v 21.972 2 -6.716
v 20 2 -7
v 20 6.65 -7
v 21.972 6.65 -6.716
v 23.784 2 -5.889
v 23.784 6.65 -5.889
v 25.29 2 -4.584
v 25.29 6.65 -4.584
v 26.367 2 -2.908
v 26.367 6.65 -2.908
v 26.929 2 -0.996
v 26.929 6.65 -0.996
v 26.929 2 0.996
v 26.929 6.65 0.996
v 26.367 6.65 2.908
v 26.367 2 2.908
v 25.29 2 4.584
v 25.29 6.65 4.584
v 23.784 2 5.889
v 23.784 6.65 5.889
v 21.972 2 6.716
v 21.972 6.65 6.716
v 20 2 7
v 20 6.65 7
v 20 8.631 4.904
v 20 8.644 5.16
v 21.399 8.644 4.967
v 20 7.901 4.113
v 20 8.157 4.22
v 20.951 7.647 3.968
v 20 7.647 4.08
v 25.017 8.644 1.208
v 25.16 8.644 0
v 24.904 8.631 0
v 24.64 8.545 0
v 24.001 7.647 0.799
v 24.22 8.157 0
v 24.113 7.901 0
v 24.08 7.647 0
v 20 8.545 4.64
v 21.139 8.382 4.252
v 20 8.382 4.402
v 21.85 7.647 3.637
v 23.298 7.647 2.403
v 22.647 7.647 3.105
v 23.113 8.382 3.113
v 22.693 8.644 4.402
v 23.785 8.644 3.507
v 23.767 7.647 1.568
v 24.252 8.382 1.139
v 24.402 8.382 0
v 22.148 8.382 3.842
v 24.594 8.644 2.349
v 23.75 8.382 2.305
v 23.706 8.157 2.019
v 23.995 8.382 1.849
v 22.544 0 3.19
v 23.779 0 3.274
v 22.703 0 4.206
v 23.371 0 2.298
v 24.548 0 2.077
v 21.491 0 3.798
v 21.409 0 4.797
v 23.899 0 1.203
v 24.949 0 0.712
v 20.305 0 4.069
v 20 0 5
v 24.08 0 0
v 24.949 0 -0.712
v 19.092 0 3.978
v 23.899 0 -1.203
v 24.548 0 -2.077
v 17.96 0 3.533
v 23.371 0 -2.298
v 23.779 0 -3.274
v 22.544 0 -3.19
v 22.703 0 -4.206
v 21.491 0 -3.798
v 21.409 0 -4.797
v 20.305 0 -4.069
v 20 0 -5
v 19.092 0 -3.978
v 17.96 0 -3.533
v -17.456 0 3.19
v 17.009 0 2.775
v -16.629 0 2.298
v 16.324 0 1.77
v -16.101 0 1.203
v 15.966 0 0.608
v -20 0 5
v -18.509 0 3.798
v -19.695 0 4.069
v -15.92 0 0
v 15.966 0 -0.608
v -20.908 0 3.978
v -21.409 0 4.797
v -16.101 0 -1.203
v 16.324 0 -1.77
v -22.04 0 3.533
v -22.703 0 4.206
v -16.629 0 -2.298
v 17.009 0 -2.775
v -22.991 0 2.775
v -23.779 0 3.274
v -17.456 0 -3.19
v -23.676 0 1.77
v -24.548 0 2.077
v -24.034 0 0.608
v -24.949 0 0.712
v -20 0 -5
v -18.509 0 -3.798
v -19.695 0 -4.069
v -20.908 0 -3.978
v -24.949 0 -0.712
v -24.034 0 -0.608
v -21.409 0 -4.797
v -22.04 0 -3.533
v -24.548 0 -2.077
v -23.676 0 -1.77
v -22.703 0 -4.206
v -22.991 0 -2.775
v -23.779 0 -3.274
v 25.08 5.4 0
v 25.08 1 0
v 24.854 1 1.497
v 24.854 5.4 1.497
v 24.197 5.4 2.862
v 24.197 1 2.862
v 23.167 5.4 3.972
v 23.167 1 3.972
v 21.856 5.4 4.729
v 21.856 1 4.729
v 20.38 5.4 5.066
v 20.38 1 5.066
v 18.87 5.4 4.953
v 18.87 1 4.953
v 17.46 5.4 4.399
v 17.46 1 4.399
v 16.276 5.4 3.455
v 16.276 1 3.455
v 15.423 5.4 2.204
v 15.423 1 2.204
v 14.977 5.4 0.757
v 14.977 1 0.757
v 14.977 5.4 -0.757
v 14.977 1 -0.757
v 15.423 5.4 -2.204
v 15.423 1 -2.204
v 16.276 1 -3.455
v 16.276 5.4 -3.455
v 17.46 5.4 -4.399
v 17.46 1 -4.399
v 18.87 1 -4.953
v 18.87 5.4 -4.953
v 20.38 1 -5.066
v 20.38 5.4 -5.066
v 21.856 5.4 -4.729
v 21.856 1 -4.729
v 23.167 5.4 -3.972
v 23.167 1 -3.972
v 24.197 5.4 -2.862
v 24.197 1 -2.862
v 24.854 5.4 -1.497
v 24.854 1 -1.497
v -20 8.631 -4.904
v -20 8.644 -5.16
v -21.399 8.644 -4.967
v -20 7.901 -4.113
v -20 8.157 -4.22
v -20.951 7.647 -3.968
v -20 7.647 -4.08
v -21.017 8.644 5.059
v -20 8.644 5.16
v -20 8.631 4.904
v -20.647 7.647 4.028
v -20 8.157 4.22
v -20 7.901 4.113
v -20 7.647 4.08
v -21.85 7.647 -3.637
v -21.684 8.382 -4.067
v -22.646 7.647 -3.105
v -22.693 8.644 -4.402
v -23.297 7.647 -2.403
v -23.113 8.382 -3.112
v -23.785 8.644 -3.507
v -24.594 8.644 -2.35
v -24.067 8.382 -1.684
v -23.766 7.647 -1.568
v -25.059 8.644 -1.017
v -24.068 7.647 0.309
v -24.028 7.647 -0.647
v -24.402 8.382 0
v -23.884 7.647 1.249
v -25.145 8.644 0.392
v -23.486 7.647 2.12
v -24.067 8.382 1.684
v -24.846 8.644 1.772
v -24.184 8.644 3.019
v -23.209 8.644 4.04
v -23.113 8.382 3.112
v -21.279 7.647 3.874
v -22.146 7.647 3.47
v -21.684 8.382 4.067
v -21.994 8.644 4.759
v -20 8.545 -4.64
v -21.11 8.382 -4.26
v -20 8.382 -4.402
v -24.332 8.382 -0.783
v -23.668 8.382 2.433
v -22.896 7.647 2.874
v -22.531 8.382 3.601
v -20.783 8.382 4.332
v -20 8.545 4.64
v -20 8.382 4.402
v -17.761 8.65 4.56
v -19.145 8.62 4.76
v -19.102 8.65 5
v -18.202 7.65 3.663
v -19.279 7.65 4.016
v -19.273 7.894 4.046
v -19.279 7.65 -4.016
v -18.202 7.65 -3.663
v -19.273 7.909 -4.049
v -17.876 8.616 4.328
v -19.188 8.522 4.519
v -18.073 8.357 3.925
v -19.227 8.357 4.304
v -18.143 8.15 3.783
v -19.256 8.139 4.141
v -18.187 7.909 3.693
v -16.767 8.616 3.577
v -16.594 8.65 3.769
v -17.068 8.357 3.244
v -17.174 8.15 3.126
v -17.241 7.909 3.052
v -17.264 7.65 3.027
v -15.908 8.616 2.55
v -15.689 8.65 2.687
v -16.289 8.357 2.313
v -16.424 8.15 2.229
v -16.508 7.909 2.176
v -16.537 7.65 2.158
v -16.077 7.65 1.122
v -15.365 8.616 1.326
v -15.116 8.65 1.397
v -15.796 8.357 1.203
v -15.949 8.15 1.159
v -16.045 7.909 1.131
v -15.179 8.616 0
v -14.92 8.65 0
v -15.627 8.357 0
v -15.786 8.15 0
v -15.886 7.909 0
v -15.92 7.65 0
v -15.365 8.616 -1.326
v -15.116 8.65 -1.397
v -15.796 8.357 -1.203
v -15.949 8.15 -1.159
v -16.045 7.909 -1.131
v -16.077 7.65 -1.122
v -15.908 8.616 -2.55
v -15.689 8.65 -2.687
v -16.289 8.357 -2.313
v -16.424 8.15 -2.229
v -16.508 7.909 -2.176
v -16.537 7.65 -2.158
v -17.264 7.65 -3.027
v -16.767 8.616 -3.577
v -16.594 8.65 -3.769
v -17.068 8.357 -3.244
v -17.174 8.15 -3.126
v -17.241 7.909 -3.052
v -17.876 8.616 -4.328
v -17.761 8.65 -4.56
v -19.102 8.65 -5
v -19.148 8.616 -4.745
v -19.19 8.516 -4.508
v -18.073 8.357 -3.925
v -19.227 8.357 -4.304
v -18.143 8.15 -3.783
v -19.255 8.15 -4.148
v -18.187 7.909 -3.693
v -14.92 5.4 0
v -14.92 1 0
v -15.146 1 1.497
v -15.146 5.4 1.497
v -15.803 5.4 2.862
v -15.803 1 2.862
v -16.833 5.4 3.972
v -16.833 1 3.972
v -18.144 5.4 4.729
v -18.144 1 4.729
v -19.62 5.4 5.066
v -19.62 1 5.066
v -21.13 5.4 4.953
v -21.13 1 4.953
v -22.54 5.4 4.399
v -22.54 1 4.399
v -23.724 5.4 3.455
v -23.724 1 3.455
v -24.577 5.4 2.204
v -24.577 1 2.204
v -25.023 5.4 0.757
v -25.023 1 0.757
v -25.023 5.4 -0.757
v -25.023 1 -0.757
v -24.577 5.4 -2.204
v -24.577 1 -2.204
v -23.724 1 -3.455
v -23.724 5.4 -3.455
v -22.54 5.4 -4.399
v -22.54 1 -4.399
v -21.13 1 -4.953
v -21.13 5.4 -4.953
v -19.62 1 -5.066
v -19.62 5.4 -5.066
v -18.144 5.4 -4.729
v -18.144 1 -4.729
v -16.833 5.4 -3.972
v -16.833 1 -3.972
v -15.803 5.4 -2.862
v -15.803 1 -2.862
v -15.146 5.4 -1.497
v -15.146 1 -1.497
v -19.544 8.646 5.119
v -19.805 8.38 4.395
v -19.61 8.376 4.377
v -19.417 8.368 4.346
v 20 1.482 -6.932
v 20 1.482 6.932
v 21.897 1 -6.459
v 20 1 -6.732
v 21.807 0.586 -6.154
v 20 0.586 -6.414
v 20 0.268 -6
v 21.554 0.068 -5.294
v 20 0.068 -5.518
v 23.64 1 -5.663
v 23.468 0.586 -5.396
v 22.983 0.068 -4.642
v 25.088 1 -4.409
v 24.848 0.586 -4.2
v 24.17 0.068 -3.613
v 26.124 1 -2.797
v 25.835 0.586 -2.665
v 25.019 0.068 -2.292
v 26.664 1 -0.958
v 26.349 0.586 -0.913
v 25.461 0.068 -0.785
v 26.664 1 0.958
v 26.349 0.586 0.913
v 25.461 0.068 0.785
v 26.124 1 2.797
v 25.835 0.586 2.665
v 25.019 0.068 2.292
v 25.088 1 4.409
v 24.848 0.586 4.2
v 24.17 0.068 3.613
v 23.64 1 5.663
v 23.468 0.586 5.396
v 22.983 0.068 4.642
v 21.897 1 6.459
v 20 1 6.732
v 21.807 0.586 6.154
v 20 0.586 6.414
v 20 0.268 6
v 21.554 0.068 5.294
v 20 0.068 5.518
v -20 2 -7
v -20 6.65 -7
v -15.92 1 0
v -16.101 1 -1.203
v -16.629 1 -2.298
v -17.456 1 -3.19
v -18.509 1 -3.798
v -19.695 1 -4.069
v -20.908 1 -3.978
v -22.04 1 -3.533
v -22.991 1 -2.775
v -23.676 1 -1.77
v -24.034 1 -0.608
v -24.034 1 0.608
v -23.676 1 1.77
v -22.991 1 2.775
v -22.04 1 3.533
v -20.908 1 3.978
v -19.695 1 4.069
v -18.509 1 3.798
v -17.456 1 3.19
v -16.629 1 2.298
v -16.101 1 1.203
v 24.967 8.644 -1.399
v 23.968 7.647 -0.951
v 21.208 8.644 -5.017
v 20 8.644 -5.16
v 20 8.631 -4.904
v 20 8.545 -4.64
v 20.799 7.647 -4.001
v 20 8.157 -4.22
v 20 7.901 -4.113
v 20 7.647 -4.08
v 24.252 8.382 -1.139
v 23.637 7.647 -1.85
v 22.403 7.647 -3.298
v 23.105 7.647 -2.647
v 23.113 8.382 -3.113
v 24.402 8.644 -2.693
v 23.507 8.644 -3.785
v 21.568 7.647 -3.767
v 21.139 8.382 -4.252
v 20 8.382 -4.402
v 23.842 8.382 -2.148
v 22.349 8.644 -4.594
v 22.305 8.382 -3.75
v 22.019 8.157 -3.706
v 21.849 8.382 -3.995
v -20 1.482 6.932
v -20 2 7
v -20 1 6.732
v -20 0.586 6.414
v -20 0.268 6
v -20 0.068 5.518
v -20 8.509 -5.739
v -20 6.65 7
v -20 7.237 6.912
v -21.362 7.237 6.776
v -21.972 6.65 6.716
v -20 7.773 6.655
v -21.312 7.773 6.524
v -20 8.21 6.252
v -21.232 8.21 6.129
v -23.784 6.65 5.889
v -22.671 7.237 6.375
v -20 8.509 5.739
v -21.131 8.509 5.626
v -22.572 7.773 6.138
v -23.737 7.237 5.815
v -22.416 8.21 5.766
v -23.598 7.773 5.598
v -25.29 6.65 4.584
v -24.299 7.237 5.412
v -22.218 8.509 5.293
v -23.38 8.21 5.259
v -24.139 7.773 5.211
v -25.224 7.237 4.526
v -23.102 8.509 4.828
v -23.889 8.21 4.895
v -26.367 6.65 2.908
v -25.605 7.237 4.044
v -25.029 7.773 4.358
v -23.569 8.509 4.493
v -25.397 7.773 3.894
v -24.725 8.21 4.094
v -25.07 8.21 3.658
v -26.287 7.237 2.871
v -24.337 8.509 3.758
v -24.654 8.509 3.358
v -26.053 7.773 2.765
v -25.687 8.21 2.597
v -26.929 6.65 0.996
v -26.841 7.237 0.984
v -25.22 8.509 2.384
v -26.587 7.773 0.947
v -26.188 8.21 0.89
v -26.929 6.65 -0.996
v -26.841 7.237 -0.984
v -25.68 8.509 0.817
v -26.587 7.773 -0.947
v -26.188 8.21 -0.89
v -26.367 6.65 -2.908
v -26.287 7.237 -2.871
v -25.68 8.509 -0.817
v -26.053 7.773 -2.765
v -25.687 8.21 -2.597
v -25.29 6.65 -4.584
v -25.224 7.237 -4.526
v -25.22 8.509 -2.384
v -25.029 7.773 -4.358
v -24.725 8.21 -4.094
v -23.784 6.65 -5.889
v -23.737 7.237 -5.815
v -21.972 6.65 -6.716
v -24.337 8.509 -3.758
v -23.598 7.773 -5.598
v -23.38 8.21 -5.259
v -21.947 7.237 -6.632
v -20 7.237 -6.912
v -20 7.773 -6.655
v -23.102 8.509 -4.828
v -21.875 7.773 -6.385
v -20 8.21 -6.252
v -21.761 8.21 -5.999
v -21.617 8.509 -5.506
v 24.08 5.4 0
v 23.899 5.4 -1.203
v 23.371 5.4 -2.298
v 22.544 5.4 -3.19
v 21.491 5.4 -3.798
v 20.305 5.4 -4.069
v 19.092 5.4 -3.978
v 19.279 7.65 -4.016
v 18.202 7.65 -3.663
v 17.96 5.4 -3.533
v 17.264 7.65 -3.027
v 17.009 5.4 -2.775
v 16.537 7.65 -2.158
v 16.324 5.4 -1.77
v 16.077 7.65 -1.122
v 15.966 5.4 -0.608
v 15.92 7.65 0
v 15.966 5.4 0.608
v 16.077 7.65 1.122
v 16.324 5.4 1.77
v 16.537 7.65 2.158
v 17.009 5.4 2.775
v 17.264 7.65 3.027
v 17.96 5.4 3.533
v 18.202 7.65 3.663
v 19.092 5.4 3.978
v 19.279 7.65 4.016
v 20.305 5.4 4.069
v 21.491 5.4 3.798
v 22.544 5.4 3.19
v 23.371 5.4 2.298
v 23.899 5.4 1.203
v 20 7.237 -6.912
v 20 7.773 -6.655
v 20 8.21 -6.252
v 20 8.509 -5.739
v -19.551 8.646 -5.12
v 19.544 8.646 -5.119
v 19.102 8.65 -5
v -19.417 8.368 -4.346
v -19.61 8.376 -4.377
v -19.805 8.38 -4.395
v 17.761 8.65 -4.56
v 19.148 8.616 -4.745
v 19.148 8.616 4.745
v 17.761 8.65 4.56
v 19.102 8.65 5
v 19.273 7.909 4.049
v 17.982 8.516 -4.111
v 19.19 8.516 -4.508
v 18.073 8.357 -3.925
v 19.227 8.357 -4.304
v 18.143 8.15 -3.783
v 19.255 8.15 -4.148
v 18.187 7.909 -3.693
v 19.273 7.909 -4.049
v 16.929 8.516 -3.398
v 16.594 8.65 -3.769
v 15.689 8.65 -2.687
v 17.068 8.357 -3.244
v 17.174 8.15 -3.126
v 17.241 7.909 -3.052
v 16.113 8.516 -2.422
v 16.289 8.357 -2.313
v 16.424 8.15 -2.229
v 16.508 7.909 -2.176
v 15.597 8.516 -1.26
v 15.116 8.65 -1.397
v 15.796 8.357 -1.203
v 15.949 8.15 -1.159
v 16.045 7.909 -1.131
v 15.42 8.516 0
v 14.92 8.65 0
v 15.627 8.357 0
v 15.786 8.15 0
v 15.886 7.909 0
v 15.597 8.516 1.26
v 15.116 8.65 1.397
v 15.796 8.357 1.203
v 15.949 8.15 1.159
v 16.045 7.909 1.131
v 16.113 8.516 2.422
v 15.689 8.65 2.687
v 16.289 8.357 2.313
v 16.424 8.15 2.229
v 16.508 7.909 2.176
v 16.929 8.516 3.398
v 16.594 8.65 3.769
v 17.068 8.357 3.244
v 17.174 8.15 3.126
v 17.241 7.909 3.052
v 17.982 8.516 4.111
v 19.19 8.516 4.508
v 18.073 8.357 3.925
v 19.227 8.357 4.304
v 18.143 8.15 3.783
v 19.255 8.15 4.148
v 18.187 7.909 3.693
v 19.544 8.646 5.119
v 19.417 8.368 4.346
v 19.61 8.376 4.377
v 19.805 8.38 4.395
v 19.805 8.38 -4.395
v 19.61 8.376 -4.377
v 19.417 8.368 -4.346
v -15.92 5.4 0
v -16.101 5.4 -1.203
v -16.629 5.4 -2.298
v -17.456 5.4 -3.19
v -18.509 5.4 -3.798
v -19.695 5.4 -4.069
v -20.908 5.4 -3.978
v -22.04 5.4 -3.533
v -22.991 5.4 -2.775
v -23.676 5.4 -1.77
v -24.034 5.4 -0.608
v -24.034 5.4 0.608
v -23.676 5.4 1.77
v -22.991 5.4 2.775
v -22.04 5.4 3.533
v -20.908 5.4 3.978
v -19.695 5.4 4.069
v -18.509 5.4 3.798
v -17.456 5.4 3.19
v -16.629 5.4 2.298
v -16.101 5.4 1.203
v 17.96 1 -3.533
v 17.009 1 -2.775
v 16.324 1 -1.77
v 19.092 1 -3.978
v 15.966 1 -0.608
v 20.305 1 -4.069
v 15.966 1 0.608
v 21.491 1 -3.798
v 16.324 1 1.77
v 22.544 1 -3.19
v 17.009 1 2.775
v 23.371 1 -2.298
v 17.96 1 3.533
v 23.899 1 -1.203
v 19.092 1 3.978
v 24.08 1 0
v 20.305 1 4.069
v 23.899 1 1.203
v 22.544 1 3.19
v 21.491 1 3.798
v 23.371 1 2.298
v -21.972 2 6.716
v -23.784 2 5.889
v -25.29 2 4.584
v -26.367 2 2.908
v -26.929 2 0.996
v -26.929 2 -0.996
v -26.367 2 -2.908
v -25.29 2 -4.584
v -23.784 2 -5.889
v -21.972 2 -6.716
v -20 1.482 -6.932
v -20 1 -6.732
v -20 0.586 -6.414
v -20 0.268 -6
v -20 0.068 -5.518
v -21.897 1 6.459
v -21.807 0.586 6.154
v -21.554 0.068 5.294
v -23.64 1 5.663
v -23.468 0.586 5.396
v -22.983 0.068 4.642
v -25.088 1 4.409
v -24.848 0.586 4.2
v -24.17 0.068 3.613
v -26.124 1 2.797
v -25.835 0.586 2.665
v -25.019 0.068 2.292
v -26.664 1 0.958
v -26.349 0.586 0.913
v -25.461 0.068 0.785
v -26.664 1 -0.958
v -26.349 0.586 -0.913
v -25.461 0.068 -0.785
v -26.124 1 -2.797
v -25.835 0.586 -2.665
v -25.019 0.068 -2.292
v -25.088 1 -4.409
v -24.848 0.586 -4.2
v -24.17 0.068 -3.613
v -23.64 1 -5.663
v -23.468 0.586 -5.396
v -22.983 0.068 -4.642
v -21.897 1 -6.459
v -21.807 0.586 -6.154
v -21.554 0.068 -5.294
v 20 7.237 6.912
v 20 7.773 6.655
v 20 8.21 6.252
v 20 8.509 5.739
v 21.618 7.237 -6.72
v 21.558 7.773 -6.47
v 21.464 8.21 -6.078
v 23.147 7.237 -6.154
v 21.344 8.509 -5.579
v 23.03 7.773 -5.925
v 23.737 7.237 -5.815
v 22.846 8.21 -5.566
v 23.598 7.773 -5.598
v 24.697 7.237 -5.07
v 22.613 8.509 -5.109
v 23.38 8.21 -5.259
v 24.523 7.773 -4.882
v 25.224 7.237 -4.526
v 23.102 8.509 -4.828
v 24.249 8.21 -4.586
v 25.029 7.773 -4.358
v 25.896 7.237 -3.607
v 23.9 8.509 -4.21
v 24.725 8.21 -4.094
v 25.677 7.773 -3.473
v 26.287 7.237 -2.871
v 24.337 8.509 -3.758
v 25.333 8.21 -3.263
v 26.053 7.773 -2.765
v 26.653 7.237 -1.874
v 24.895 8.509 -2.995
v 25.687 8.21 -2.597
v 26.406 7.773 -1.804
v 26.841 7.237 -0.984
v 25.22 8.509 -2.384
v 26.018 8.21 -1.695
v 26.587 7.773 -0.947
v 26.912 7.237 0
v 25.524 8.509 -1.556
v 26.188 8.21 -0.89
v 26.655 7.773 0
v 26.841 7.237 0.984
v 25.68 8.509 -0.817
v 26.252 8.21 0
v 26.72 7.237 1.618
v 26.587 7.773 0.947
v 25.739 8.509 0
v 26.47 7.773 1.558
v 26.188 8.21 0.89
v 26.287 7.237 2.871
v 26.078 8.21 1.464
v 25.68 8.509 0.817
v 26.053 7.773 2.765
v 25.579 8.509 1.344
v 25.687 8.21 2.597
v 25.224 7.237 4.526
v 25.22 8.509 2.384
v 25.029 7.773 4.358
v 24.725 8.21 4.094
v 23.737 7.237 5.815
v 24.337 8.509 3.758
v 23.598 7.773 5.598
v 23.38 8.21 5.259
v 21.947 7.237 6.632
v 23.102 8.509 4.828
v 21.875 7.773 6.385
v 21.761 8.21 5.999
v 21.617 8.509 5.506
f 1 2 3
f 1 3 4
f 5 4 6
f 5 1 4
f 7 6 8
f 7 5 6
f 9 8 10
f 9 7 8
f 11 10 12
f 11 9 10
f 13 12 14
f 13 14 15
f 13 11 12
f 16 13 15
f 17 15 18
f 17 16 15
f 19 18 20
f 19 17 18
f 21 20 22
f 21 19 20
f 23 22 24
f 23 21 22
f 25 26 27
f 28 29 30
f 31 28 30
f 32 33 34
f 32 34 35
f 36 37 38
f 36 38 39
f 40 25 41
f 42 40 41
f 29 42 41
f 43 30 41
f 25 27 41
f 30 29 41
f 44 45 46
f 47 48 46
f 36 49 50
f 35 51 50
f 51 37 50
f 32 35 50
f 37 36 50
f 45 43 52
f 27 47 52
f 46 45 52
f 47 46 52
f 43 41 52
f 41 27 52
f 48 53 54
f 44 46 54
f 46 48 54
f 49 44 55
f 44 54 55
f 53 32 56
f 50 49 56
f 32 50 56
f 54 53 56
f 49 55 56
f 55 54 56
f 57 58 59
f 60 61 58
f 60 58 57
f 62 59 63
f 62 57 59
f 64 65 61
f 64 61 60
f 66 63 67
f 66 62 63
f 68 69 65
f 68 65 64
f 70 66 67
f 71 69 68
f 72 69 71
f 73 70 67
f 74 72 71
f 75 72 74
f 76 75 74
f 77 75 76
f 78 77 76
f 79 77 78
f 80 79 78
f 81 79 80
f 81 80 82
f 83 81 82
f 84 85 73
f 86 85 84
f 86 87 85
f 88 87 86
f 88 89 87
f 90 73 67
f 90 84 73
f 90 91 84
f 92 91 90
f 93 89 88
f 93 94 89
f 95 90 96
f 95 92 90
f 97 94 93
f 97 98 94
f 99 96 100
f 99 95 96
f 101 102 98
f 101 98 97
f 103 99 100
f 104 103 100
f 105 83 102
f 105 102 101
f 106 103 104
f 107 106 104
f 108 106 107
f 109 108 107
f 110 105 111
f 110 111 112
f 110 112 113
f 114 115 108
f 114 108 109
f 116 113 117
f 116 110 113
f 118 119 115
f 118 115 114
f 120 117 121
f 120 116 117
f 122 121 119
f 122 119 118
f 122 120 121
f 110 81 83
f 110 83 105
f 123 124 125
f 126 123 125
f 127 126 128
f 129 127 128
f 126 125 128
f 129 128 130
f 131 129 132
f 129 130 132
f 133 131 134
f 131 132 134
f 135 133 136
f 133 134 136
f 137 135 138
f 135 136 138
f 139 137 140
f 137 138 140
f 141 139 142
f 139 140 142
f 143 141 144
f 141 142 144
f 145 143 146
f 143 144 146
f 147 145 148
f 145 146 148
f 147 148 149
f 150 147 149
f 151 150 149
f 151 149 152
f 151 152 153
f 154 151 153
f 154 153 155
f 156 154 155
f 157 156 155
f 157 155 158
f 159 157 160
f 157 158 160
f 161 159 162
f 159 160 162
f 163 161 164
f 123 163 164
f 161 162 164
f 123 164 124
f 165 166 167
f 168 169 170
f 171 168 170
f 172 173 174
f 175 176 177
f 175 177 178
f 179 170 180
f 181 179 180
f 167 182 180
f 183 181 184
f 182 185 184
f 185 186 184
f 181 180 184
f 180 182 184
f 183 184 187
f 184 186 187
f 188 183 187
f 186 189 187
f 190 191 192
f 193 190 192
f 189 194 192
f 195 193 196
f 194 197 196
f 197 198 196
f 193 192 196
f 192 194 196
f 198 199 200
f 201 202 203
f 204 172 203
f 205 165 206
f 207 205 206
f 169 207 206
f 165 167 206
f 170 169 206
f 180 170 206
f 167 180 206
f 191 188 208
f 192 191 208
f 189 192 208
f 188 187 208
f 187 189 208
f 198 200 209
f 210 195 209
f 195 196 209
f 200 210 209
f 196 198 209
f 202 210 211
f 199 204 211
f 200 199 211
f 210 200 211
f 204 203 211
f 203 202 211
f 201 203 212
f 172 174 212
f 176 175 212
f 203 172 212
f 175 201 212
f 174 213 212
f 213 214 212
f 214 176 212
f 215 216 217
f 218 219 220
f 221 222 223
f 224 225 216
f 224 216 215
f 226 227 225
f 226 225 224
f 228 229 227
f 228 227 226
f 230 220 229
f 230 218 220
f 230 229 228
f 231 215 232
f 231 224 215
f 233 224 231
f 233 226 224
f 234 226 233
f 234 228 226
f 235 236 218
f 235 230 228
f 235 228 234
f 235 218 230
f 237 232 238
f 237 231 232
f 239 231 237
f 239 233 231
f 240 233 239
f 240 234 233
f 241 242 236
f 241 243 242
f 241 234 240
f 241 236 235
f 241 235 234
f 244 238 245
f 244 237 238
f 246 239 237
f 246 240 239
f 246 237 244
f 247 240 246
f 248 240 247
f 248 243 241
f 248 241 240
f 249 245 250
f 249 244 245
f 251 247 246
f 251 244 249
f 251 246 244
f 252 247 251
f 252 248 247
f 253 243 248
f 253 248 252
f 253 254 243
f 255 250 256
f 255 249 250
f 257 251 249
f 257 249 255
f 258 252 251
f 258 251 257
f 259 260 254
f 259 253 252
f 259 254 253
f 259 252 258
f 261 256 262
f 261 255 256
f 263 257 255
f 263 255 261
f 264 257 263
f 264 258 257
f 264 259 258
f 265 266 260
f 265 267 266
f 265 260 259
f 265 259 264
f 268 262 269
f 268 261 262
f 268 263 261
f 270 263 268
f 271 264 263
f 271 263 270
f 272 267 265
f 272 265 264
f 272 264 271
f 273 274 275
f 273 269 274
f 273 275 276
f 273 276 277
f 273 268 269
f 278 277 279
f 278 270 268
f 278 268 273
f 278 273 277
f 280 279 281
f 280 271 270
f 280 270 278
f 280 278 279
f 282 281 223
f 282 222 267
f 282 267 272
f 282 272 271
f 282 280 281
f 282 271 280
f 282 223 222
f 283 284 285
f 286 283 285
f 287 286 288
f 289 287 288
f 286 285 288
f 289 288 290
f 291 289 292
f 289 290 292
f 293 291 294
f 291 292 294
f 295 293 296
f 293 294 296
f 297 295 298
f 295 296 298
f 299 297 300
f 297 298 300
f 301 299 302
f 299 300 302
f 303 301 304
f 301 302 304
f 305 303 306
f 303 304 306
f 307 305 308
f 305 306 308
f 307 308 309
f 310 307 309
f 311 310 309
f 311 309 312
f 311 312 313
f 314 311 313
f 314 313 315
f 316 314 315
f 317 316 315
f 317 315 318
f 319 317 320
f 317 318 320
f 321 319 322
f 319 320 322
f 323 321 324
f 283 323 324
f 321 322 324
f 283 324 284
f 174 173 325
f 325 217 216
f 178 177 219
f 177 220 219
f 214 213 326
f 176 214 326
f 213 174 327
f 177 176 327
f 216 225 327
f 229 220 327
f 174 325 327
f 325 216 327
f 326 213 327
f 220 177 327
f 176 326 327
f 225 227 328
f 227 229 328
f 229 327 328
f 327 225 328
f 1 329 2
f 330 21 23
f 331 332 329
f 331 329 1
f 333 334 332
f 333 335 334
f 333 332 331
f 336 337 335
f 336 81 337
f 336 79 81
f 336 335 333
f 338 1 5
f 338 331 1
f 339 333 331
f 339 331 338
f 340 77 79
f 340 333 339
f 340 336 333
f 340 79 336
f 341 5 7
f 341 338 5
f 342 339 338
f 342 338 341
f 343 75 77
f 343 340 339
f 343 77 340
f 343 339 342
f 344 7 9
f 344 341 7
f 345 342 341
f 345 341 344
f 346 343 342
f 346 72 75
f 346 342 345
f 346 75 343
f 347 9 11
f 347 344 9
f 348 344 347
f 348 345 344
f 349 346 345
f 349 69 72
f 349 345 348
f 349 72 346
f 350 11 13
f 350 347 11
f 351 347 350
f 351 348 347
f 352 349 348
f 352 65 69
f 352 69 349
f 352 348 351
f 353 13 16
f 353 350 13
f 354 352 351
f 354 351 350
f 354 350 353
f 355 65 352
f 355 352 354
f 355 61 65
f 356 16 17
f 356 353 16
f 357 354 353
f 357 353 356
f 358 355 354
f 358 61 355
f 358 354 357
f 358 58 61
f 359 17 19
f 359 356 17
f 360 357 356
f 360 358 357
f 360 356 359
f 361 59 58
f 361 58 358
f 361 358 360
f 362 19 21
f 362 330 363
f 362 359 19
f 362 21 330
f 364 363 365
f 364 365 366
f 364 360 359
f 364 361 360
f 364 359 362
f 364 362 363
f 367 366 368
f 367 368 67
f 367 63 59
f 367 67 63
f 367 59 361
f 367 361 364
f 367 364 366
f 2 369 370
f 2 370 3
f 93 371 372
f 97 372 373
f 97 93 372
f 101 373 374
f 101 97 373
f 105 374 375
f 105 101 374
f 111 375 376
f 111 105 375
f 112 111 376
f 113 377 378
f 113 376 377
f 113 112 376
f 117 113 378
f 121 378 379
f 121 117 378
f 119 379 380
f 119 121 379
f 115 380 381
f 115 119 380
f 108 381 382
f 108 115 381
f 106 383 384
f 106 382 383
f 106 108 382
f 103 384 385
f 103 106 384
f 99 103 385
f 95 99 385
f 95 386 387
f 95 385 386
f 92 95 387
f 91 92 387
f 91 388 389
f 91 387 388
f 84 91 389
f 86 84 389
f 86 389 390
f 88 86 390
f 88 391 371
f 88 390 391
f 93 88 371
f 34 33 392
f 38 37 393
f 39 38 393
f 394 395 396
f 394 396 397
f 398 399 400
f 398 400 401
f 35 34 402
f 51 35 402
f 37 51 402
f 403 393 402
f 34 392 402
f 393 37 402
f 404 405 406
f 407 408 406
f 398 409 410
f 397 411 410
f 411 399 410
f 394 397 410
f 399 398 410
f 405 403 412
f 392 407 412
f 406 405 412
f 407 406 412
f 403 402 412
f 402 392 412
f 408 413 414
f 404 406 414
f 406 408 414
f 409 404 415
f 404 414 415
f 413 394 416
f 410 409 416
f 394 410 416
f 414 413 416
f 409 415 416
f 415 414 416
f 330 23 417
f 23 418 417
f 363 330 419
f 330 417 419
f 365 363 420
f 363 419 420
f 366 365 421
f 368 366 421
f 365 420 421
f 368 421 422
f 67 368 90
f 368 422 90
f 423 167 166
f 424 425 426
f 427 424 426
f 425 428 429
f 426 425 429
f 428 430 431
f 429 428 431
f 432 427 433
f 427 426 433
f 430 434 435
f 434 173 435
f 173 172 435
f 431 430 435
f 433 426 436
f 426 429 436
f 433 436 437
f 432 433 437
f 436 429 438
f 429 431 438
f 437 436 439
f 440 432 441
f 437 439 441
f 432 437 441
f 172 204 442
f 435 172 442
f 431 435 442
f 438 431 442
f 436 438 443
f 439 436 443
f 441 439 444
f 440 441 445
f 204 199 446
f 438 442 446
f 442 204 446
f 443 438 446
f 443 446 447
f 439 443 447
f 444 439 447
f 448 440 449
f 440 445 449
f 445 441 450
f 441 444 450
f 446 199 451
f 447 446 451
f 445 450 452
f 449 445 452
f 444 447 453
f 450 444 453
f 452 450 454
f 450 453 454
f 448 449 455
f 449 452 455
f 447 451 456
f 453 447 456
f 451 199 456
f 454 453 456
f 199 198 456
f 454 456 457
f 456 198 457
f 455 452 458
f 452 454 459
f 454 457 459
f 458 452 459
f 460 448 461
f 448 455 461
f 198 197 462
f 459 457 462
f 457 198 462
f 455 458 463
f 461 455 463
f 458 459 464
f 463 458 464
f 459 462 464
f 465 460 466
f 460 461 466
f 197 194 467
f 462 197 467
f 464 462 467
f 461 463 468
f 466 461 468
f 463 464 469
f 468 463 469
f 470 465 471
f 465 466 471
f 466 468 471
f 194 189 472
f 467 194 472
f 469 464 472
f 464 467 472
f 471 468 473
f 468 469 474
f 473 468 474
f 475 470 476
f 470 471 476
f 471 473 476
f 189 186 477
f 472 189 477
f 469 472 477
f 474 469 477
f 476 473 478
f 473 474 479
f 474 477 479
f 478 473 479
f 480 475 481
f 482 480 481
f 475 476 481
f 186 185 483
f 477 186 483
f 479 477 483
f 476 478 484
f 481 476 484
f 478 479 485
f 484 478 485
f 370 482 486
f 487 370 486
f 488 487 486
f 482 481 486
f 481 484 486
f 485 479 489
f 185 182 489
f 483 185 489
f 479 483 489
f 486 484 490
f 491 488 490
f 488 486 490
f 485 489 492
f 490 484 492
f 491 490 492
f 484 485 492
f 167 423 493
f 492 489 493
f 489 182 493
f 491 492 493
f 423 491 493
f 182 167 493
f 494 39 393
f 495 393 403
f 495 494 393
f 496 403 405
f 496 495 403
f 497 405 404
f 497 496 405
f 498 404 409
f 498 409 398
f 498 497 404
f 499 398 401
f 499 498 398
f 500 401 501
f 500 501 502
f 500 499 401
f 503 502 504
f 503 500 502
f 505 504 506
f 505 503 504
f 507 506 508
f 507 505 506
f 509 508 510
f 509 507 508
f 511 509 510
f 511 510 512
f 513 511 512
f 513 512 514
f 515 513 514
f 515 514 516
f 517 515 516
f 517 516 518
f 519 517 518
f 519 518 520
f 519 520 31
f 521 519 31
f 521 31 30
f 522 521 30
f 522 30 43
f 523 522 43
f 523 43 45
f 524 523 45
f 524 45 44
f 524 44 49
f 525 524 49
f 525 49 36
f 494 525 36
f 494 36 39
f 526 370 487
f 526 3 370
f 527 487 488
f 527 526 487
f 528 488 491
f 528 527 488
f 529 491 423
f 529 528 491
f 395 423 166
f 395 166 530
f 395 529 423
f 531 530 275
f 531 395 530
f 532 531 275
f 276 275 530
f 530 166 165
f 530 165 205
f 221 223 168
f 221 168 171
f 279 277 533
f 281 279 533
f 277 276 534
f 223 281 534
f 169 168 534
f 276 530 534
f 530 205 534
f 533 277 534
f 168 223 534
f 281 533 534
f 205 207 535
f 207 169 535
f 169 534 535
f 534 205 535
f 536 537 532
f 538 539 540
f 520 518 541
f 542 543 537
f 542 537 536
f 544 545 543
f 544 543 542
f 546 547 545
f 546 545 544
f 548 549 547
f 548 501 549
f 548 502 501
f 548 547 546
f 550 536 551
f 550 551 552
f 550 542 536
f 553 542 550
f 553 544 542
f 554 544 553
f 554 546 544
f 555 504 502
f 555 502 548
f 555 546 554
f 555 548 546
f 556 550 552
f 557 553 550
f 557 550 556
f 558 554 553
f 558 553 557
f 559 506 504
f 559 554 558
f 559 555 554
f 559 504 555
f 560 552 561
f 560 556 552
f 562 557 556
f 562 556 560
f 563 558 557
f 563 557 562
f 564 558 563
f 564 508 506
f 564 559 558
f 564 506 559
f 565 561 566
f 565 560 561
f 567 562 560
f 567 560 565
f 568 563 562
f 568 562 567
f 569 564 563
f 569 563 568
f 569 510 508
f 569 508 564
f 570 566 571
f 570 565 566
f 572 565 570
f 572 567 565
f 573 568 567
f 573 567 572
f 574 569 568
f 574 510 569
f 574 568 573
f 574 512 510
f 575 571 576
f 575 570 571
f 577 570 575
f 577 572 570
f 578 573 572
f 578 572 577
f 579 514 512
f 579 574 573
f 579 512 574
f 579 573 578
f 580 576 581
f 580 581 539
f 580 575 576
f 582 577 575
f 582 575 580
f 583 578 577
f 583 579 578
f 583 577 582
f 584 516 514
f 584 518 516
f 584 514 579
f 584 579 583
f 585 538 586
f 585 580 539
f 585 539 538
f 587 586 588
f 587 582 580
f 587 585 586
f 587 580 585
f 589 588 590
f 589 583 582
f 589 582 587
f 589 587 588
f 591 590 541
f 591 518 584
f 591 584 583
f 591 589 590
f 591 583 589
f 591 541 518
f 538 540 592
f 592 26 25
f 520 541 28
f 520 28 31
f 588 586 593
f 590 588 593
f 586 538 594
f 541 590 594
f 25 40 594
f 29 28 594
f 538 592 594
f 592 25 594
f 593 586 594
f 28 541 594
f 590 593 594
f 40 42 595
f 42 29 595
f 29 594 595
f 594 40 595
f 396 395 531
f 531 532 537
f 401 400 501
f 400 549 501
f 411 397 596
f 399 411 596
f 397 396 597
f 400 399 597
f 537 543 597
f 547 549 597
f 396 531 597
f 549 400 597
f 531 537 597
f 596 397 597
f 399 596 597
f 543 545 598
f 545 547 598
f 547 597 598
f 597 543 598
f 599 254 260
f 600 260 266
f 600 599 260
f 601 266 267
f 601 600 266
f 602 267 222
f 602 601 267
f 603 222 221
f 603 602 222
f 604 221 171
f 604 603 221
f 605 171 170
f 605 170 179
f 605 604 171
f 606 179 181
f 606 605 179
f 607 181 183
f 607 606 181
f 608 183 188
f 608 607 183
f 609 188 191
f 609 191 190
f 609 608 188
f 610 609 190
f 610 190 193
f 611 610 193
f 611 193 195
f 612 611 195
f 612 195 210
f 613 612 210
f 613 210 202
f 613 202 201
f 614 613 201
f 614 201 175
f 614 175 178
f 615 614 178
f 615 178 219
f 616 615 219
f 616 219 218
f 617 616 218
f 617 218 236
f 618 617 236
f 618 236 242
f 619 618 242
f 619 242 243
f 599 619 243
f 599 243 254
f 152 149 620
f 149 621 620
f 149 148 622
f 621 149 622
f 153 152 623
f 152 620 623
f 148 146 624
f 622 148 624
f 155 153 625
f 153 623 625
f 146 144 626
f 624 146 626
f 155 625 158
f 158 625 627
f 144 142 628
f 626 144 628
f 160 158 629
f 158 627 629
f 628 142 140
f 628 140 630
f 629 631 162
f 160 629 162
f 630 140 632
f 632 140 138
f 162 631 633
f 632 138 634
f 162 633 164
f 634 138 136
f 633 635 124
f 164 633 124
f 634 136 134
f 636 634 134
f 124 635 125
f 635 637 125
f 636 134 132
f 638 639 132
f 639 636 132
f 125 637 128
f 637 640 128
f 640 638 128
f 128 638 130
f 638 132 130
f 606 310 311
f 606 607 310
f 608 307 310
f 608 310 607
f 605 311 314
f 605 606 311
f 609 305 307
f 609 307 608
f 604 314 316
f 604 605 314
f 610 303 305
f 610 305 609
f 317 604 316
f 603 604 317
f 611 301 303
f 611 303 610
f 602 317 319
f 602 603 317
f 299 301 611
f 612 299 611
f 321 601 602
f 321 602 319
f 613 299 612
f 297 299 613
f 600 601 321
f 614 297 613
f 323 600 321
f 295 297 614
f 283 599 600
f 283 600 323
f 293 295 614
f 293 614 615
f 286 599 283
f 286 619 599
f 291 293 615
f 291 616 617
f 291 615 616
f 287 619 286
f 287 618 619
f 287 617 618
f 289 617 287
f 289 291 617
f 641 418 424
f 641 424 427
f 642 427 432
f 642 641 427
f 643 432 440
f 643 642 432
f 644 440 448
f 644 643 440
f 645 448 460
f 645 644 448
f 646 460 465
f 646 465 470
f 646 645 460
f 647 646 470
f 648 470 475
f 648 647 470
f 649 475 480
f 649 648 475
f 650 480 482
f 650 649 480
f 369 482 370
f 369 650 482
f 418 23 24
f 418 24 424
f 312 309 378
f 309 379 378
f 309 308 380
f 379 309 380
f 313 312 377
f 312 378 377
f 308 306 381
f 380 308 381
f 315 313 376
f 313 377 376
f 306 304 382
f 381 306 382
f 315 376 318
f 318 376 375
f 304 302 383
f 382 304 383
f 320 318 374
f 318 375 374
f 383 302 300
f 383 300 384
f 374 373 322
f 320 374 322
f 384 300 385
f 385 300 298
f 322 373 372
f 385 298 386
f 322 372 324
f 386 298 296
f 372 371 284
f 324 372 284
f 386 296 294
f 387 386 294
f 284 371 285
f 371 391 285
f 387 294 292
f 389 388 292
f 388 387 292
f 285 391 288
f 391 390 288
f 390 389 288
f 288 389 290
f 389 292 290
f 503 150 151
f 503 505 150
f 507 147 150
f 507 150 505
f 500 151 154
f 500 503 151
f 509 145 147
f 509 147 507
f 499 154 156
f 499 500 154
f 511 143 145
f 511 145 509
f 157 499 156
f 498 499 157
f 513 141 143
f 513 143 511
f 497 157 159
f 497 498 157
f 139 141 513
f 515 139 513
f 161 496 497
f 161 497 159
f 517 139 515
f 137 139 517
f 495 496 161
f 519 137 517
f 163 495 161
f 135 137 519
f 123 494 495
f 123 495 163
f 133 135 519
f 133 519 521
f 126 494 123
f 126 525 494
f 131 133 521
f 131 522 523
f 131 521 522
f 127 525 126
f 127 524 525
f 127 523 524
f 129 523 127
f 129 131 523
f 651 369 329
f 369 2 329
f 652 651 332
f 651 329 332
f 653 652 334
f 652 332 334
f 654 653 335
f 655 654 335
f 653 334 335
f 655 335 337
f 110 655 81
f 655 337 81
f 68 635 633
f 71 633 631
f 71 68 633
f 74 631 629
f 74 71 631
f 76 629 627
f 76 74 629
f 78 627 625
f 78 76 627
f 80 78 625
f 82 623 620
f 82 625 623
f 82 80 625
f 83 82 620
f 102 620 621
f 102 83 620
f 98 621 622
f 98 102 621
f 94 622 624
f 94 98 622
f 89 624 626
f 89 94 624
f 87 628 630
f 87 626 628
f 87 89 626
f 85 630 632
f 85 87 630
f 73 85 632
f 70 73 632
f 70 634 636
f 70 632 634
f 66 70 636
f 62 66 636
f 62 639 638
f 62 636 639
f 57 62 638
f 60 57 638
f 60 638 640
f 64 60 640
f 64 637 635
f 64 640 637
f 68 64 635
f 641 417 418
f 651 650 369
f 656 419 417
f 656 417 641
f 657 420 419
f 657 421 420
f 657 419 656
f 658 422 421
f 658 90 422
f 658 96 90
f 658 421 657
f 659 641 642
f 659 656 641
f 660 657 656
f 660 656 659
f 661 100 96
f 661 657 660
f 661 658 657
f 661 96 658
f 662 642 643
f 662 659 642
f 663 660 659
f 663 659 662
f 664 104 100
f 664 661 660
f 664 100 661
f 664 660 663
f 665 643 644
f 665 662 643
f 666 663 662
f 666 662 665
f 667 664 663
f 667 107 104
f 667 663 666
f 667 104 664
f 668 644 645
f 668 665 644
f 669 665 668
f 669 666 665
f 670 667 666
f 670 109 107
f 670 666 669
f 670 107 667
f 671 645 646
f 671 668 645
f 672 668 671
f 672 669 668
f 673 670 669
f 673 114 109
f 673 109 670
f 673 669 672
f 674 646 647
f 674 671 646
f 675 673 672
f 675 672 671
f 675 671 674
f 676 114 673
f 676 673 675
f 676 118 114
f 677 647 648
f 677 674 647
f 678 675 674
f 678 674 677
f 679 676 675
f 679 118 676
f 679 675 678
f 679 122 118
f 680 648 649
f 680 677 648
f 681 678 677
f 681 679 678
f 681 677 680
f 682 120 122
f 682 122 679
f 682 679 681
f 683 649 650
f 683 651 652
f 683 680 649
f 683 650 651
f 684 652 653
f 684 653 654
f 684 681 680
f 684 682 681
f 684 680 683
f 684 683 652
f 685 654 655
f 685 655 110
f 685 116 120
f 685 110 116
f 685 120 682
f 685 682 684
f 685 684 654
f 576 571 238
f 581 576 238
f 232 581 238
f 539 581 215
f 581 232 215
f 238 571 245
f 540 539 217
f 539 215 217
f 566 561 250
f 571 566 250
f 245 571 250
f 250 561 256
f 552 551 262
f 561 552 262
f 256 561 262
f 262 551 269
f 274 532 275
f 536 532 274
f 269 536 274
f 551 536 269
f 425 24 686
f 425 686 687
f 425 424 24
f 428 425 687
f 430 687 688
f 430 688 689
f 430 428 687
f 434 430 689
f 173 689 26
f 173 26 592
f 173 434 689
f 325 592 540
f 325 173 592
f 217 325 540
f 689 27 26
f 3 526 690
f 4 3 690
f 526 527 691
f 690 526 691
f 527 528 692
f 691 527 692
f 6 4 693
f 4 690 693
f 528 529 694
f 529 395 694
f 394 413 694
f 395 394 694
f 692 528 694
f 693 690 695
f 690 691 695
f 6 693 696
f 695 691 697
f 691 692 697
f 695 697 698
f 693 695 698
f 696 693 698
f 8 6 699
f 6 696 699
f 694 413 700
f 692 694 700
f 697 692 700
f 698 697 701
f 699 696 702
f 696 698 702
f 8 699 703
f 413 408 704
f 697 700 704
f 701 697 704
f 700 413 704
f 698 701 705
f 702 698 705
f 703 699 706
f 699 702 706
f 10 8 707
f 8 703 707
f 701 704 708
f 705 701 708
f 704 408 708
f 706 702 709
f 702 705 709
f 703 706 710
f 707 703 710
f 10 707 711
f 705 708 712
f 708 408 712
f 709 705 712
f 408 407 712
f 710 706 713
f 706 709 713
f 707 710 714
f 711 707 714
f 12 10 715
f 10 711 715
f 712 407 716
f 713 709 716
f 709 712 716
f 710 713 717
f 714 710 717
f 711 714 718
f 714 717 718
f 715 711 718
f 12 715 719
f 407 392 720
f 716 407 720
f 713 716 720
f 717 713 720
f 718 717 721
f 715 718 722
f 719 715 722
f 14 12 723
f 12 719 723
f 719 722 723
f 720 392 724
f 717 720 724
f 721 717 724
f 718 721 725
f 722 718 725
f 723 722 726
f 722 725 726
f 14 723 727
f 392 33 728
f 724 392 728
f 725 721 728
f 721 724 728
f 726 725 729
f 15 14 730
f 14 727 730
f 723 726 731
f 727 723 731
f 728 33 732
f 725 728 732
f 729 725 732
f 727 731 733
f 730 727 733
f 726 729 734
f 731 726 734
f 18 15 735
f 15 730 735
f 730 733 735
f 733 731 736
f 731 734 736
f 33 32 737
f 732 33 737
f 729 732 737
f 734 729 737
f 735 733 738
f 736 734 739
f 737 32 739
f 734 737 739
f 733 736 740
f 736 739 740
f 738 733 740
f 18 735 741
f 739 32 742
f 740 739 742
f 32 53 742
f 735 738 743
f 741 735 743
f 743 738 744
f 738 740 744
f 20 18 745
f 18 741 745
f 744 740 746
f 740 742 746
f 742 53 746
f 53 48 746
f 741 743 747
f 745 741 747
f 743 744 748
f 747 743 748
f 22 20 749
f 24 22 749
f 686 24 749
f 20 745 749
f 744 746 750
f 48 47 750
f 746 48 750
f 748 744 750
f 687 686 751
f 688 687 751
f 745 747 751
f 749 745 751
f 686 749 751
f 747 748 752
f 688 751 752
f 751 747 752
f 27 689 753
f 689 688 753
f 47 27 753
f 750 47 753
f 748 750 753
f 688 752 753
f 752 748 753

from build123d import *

# Parameters (mm, degrees)
SKETCH1_R           = 4.08
BOSS_EXTRUDE1_DEPTH = 8.65
CUT_EXTRUDE1_START  = -1
SKETCH2_R           = 5.08
CUT_EXTRUDE1_DEPTH  = 4.4
FILLET1_R           = 2
FILLET2_R           = 1


with BuildPart() as part:
    # Sketch1 → Boss-Extrude1 (new body)
    with BuildSketch(Plane(origin=(0, 0, 0), x_dir=(1, 0, 0), z_dir=(0, 1, 0))):
        with BuildLine():
            Line((-20, 7), (20, 7))
            ThreePointArc((20, 7), (27, 0), (20, -7))
            Line((20, -7), (-20, -7))
            ThreePointArc((-20, -7), (-27, 0), (-20, 7))
        make_face()
        with Locations((-20, 0)):
            Circle(SKETCH1_R, mode=Mode.SUBTRACT)
        with Locations((20, 0)):
            Circle(SKETCH1_R, mode=Mode.SUBTRACT)
    extrude(amount=BOSS_EXTRUDE1_DEPTH)

    # Sketch2 → Cut-Extrude1 (cut)
    with BuildSketch(Plane.XZ.offset(CUT_EXTRUDE1_START)):
        with Locations((-20, 0)):
            Circle(SKETCH2_R)
        with Locations((20, 0)):
            Circle(SKETCH2_R)
    extrude(amount=-CUT_EXTRUDE1_DEPTH, mode=Mode.SUBTRACT)

    # Fillet1
    fillet1_edges = [part.edges().sort_by_distance(p)[0] for p in [
        (27, 8.65, 0),
        (0, 8.65, -7),
        (-27, 8.65, 0),
        (0, 0, -7),
        (27, 0, 0),
        (0, 0, 7),
        (-27, 0, 0),
        (0, 8.65, 7),
    ]]
    fillet(fillet1_edges, radius=FILLET1_R)

    # Fillet2
    fillet2_edges = [part.edges().sort_by_distance(p)[0] for p in [
        (-24.08, 8.65, 0),
        (15.92, 8.65, 0),
    ]]
    fillet(fillet2_edges, radius=FILLET2_R)


solid = part.part
